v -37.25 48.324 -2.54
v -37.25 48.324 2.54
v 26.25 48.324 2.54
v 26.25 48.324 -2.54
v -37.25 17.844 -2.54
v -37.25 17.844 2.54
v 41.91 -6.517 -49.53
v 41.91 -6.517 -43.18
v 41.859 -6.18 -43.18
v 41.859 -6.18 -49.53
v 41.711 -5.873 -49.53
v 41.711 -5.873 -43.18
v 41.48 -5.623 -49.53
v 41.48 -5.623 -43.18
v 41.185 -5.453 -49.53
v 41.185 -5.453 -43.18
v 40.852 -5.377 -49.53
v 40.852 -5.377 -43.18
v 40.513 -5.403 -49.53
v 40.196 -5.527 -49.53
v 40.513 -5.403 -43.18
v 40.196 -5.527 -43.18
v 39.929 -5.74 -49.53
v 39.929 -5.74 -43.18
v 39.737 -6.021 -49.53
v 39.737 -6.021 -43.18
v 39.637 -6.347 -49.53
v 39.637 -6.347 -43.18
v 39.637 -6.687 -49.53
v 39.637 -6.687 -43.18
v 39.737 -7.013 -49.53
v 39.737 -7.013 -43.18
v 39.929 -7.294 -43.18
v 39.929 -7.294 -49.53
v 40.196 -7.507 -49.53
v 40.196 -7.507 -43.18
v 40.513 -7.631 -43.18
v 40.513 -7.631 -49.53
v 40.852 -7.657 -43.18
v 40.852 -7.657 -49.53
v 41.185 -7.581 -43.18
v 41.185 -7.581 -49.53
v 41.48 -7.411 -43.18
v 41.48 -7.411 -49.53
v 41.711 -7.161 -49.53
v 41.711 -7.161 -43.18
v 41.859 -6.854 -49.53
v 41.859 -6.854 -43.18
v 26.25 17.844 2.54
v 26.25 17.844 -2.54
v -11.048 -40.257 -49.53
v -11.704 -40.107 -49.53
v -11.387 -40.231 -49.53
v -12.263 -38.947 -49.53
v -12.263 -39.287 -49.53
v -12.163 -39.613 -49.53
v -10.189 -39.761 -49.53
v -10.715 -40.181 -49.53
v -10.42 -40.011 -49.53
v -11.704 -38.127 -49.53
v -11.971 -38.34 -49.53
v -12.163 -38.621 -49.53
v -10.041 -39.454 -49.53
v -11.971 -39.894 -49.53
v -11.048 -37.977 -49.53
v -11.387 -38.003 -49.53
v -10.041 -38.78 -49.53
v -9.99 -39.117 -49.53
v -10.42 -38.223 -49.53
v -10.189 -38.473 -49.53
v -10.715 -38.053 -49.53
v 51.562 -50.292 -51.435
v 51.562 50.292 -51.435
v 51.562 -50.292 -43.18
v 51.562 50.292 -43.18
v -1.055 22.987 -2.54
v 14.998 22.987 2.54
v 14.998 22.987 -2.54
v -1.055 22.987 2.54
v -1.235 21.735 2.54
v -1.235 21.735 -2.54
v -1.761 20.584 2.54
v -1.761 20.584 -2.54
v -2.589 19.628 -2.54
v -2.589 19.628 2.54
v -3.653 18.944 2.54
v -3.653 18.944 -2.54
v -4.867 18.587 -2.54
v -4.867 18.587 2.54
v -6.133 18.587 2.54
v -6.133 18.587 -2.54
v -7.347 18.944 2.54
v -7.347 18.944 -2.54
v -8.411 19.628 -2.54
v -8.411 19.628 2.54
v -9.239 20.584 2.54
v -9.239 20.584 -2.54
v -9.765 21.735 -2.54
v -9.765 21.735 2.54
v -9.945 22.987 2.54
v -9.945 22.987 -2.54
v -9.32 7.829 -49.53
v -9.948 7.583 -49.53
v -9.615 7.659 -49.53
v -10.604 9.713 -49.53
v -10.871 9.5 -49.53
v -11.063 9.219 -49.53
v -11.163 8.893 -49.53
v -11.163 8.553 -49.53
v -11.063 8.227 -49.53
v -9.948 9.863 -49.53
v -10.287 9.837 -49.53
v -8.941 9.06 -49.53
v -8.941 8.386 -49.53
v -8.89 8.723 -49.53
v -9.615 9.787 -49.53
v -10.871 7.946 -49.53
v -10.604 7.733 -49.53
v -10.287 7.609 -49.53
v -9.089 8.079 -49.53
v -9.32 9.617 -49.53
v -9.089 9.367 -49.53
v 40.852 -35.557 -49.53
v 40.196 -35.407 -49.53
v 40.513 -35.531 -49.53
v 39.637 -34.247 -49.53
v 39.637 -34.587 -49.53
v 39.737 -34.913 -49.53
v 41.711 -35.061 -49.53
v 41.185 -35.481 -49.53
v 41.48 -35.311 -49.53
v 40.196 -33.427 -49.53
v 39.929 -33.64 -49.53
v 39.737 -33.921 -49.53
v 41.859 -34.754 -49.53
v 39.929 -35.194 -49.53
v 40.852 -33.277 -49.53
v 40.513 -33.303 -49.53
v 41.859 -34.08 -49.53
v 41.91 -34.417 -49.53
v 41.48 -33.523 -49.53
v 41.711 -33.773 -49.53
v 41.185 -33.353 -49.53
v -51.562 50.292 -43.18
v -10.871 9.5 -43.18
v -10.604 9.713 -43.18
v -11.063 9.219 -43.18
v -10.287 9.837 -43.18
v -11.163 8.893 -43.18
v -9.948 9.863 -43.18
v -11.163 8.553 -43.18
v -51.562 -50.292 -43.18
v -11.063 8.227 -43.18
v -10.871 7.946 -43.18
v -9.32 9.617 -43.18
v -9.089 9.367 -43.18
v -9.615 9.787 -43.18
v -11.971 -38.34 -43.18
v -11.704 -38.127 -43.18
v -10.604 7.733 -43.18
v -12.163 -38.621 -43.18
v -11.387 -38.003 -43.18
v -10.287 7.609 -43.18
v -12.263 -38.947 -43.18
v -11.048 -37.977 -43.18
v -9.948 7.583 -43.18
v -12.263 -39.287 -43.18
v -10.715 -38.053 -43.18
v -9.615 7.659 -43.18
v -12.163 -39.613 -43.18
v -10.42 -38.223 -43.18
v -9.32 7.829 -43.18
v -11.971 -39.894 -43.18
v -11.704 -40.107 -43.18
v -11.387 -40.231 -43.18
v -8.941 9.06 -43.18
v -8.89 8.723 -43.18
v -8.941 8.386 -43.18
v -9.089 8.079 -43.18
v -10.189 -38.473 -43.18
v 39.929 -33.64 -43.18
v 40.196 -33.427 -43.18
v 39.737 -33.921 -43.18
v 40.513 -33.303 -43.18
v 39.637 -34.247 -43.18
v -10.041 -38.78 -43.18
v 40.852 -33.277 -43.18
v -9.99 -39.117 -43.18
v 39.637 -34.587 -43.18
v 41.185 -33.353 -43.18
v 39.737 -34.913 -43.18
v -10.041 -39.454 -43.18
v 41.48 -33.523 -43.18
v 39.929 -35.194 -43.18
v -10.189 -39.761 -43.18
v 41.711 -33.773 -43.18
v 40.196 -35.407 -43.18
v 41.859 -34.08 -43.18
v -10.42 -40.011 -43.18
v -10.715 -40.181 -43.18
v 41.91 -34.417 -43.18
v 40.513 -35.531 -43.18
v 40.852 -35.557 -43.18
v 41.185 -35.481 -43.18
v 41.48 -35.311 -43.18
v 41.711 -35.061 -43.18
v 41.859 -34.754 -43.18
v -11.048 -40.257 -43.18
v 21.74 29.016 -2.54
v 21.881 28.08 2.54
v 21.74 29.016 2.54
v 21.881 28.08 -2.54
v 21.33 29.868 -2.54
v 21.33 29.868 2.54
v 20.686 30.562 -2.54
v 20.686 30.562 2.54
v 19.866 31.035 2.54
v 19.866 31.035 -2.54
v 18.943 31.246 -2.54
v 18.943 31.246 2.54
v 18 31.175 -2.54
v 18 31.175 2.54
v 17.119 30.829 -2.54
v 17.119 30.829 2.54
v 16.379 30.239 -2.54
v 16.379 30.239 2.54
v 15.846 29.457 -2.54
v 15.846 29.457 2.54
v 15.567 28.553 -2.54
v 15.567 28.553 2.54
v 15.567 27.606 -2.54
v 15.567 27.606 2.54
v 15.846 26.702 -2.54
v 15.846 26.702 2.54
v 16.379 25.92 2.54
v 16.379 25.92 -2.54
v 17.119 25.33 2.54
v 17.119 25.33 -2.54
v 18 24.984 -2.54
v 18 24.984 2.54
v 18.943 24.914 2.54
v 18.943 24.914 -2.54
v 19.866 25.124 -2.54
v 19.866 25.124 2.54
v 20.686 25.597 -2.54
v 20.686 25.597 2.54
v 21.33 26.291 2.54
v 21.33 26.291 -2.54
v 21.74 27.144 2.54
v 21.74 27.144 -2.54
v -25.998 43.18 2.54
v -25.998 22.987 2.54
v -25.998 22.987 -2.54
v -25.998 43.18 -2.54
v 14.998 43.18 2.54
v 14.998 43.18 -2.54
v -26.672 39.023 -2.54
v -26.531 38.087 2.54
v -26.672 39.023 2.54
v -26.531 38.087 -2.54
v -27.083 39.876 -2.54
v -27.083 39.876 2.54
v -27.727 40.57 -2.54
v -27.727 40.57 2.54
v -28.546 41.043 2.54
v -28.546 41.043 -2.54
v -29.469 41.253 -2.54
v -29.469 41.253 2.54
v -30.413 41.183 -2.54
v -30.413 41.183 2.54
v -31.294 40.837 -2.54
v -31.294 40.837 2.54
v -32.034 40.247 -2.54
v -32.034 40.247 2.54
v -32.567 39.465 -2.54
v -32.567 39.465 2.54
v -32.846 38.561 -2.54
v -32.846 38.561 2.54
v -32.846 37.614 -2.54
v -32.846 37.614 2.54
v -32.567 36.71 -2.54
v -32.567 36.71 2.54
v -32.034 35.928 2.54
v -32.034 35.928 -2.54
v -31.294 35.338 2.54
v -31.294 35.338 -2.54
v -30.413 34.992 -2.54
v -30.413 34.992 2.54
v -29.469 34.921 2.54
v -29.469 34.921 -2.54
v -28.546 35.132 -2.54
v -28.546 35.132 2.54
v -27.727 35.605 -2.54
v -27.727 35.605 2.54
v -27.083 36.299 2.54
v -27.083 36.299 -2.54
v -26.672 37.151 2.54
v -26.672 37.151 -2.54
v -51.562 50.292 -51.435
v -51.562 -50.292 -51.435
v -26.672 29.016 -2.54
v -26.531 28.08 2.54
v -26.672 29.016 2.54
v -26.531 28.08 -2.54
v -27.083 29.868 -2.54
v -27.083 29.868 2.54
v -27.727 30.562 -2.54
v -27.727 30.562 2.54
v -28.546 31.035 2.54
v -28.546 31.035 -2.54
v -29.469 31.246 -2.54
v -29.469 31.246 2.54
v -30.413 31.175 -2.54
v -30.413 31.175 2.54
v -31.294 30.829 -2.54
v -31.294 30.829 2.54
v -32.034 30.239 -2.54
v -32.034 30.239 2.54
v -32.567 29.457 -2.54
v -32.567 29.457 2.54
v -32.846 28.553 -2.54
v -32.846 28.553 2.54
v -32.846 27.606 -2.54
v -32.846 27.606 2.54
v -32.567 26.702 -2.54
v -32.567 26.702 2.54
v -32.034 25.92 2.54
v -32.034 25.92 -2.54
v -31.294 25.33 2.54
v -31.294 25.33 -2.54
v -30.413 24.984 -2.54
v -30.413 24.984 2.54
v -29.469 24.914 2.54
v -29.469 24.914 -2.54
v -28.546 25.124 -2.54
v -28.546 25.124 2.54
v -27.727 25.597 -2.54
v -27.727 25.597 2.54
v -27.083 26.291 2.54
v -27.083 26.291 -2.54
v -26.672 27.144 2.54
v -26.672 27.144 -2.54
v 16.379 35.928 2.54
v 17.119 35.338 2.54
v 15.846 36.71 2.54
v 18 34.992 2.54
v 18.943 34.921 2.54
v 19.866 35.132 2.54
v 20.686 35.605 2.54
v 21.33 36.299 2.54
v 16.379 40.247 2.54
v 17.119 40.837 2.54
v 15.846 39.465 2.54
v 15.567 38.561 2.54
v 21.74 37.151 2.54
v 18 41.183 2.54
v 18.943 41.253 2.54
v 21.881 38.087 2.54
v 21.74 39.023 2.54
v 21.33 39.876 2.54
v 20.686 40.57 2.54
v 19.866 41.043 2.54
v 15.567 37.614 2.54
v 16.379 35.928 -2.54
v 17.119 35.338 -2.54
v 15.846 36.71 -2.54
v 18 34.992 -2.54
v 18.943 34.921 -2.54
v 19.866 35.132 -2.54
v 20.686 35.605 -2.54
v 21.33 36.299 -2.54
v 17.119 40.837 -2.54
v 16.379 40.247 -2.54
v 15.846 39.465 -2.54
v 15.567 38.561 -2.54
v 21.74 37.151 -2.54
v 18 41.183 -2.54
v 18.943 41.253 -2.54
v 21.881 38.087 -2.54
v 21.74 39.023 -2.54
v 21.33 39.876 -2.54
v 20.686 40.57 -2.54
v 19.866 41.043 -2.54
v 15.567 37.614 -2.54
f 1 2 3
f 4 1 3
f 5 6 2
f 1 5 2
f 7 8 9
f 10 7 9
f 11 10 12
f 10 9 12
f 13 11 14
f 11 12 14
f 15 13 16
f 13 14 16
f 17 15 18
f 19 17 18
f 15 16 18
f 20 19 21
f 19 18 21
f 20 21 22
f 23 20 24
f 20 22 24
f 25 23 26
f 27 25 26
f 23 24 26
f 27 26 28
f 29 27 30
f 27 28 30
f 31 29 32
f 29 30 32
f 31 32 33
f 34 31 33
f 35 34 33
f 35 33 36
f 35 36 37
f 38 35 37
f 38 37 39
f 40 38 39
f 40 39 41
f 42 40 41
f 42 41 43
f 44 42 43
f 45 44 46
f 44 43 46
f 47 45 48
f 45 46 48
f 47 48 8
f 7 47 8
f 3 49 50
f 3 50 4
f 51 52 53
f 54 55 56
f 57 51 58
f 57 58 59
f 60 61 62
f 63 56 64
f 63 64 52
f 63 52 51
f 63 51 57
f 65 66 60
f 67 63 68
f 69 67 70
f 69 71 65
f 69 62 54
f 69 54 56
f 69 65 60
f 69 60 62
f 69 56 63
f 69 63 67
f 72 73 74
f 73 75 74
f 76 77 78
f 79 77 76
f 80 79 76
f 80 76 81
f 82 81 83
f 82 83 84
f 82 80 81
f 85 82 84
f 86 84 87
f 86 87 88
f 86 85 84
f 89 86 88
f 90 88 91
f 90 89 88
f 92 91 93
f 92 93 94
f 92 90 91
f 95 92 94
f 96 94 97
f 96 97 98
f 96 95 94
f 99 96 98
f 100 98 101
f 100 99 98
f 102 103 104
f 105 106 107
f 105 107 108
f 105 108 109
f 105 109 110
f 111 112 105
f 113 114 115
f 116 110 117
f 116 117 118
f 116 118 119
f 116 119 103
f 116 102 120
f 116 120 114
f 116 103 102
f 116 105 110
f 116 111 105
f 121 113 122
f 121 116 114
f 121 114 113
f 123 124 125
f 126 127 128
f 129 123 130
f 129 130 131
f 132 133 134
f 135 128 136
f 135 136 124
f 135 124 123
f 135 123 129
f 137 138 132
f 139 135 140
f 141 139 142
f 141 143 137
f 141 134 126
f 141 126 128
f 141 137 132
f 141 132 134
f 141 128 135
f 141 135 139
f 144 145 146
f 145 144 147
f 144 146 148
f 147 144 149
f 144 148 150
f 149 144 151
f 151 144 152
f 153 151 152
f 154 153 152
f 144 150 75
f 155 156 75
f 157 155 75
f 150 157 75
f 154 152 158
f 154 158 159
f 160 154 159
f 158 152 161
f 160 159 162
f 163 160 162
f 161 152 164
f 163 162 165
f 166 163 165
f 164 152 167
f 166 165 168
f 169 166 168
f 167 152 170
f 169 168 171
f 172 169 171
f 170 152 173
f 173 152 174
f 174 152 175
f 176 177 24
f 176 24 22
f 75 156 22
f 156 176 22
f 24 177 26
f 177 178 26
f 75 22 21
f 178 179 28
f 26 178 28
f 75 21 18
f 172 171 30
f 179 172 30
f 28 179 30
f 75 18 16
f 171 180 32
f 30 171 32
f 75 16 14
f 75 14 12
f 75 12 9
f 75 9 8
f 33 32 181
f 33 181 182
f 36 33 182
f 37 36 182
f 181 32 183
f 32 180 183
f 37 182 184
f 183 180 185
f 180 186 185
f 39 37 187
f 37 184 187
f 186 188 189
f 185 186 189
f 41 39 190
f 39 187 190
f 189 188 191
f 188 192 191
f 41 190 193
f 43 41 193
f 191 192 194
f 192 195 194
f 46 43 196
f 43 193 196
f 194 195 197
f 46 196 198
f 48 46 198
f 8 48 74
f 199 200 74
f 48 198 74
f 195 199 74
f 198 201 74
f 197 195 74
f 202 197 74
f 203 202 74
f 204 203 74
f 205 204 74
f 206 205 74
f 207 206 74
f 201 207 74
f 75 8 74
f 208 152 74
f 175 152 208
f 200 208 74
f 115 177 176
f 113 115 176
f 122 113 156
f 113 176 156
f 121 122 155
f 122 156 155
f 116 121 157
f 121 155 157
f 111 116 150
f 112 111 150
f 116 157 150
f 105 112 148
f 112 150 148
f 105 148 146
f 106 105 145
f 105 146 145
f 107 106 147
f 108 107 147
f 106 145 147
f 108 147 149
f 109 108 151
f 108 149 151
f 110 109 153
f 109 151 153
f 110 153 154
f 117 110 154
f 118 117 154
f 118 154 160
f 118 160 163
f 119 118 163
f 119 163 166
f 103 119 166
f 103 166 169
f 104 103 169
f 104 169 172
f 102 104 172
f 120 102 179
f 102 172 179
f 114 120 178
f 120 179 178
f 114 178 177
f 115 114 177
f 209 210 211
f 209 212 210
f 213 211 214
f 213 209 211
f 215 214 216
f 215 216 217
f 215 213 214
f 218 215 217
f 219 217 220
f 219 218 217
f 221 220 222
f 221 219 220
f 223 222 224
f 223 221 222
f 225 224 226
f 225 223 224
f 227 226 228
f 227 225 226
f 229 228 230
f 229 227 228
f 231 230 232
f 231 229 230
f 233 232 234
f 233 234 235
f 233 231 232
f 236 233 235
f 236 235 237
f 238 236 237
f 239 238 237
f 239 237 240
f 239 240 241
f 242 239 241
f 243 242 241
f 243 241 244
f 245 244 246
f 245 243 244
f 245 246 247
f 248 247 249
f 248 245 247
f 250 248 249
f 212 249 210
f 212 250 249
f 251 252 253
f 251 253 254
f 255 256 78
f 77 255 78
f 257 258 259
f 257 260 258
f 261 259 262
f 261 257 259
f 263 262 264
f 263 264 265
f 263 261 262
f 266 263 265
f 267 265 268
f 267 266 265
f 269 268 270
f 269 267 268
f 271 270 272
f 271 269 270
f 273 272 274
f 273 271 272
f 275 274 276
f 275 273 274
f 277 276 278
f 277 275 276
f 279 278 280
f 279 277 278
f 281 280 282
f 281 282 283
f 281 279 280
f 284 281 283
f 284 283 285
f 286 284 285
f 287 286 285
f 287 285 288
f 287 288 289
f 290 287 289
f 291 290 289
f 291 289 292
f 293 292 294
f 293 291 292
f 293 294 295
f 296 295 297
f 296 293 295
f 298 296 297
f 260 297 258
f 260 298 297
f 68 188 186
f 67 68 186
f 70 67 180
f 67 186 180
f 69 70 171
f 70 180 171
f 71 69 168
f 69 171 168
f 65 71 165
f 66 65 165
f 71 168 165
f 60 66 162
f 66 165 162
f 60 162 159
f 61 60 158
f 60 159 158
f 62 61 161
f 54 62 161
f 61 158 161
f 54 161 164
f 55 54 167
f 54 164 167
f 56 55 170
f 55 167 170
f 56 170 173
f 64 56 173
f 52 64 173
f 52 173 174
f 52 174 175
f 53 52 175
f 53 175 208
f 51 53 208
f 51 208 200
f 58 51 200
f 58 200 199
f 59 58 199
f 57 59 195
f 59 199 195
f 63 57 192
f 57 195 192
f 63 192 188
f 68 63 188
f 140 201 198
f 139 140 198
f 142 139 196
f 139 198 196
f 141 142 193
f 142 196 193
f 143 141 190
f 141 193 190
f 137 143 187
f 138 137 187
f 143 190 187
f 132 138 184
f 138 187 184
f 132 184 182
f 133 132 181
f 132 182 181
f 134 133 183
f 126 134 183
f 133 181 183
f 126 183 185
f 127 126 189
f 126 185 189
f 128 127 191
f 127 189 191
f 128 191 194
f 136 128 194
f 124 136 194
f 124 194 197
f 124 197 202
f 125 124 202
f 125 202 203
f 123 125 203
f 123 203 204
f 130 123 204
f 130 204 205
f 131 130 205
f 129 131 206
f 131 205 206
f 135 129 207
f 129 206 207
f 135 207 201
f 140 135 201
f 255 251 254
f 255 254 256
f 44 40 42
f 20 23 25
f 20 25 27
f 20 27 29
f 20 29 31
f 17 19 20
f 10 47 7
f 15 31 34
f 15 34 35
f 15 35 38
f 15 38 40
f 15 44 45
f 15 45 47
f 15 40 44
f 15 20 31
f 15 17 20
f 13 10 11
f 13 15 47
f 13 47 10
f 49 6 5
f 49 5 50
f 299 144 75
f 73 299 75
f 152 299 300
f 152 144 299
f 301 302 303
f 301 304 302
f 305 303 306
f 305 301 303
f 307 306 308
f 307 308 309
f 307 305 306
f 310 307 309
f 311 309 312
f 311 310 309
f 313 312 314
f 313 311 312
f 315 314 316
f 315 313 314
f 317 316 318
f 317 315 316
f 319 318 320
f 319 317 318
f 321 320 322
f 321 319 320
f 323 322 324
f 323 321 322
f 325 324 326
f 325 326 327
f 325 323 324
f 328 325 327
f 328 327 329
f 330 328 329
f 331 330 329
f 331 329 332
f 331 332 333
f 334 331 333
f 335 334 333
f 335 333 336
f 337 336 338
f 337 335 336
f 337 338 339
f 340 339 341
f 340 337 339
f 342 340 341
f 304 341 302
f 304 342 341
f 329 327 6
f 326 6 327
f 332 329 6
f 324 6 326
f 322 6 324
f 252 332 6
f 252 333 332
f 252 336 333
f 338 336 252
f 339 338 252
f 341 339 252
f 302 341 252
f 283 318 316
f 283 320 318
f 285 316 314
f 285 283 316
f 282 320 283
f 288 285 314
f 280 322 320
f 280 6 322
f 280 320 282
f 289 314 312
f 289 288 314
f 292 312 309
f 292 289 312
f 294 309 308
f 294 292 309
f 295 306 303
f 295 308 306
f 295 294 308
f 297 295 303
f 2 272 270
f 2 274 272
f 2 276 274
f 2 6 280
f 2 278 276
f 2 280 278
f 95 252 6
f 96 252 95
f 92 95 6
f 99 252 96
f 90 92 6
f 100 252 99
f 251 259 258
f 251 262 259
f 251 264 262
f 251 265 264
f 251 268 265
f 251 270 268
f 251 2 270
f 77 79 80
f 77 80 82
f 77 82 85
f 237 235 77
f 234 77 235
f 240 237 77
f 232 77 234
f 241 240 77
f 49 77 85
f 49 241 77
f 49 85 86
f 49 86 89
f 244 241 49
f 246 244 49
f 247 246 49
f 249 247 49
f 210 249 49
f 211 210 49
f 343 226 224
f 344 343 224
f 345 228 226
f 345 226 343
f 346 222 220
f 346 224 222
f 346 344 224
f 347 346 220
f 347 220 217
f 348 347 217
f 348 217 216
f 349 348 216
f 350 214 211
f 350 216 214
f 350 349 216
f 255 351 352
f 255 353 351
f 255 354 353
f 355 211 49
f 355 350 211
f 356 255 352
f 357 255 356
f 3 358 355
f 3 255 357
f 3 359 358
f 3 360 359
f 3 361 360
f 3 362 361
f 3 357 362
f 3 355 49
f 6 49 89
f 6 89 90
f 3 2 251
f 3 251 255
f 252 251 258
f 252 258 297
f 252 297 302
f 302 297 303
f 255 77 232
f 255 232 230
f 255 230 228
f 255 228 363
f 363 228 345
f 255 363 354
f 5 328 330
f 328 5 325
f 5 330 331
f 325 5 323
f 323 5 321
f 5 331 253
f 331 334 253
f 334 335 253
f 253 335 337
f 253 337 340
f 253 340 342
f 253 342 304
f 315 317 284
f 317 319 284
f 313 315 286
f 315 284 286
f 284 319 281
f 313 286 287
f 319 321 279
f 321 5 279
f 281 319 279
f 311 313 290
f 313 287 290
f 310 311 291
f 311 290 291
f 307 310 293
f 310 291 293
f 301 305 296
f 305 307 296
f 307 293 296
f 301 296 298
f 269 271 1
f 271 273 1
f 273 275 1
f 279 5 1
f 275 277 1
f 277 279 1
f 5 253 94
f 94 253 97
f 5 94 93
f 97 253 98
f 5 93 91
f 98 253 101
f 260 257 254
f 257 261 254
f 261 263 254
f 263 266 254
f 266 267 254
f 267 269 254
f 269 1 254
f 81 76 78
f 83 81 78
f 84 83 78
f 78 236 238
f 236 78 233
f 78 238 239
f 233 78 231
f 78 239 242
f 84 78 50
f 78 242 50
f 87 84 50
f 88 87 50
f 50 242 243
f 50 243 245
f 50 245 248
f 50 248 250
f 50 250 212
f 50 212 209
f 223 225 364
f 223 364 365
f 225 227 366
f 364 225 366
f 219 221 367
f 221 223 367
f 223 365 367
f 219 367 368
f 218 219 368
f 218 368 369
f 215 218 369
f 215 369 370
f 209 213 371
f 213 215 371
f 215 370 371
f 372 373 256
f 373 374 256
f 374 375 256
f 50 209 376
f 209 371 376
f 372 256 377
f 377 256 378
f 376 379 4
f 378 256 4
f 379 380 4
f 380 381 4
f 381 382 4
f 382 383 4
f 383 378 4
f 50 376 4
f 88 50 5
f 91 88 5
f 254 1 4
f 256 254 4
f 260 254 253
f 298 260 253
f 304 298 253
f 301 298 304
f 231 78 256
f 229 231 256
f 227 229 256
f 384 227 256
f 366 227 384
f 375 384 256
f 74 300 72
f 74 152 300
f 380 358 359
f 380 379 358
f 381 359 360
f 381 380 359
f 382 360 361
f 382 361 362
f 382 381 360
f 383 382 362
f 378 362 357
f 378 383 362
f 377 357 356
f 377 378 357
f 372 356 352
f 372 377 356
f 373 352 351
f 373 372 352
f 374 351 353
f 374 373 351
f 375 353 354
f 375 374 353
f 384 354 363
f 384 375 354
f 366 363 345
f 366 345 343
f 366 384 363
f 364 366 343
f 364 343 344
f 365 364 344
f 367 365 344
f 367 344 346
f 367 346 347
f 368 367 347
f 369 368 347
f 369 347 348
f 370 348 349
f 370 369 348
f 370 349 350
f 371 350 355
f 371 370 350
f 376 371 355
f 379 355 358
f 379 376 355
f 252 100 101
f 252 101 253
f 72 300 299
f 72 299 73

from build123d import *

# Parameters (mm, degrees)
F0_R      = 3.175
F1_DEPTH  = 2.54
F2_W      = 114.3
F2_H      = 114.3
F2_W_2    = 104.14
F2_H_2    = 101.6
F3_DEPTH  = 3.175
F4_W      = 103.124
F4_H      = 100.584
F4_W_2    = 92.964
F4_H_2    = 90.424
F5_DEPTH  = 48.895
F6_W      = 103.124
F6_H      = 100.584
F7_DEPTH  = 8.255
F8_R      = 1.143
F9_DEPTH  = 6.35
F10_R     = 6.35
F11_R     = 1.143
F12_DEPTH = 12.7
F13_R     = 1.651
F14_DEPTH = 53.976
F15_W     = 114.3
F15_H     = 114.3
F15_W_2   = 63.5
F15_H_2   = 30.48
F16_DEPTH = 45.72
F17_W     = 63.5
F17_H     = 3.1115
F18_DEPTH = 45.721


with BuildPart() as f1:
    # F0 (on Top) → F1 (new body, symmetric)
    with BuildSketch(Plane.XY):
        Polygon((57.15, -57.15), (57.15, 57.15), (0, 57.15), (-5.5, 57.15), (-57.15, 57.15), (-57.15, -57.15), align=None)
        with Locations((-29.7062, 28.0797)):
            Circle(F0_R, mode=Mode.SUBTRACT)
        with Locations((-29.7062, 38.0873)):
            Circle(F0_R, mode=Mode.SUBTRACT)
        with BuildLine():
            Line((-25.9978, 22.987), (-25.9978, 43.18))
            Line((-25.9978, 43.18), (14.9978, 43.18))
            Line((14.9978, 43.18), (14.9978, 22.987))
            Line((14.9978, 22.987), (-1.055, 22.987))
            ThreePointArc((-1.055, 22.987), (-5.5, 18.542), (-9.945, 22.987))
            Line((-9.945, 22.987), (-25.9978, 22.987))
        make_face(mode=Mode.SUBTRACT)
        with Locations((18.7062, 28.0797)):
            Circle(F0_R, mode=Mode.SUBTRACT)
        with Locations((18.7062, 38.0873)):
            Circle(F0_R, mode=Mode.SUBTRACT)
    extrude(amount=F1_DEPTH, both=True)

    # F2 (on face) → F3 (join)
    with BuildSketch(Plane(origin=(0, 0, -2.54), x_dir=(1, 0, 0), z_dir=(0, 0, -1))):
        Rectangle(F2_W, F2_H)
        Rectangle(F2_W_2, F2_H_2, mode=Mode.SUBTRACT)
    extrude(amount=F3_DEPTH)

    # F13 (on face) → F14 (cut, through all)
    with BuildSketch(Plane.XY.offset(2.54)):
        with Locations((-48.006, -46.736)):
            Circle(F13_R)
        with Locations((-48.006, 46.736)):
            Circle(F13_R)
        with Locations((48.006, 46.736)):
            Circle(F13_R)
        with Locations((48.006, -46.736)):
            Circle(F13_R)
    extrude(amount=-F14_DEPTH, mode=Mode.SUBTRACT)


with BuildPart() as f5:
    # F4 (on face) → F5 (new body)
    with BuildSketch(Plane(origin=(0, 0, -2.54), x_dir=(1, 0, 0), z_dir=(0, 0, -1))):
        Rectangle(F4_W, F4_H)
        Rectangle(F4_W_2, F4_H_2, mode=Mode.SUBTRACT)
    extrude(amount=F5_DEPTH)

    # F6 (on face) → F7 (join)
    with BuildSketch(Plane(origin=(0, 0, -51.435), x_dir=(1, 0, 0), z_dir=(0, 0, -1))):
        Rectangle(F6_W, F6_H)
    extrude(amount=-F7_DEPTH)

    # F8 (on face) → F9 (cut)
    with BuildSketch(Plane.XY.offset(-43.18)):
        with Locations((-10.033, 8.723)):
            Circle(F8_R)
        with Locations((40.767, -6.517)):
            Circle(F8_R)
        with Locations((40.767, -34.417)):
            Circle(F8_R)
        with Locations((-11.133, -39.117)):
            Circle(F8_R)
    extrude(amount=-F9_DEPTH, mode=Mode.SUBTRACT)

    # F10
    f10_edges = [f5.edges().sort_by_distance(p)[0] for p in [
        (-46.482, 45.212, -22.86),
        (46.482, 45.212, -22.86),
        (46.482, -45.212, -22.86),
        (-46.482, -45.212, -22.86),
    ]]
    fillet(f10_edges, radius=F10_R)

    # F11 (on face) → F12 (cut)
    with BuildSketch(Plane.XY.offset(-2.54)):
        with Locations((-48.006, 46.736)):
            Circle(F11_R)
        with Locations((48.006, 46.736)):
            Circle(F11_R)
        with Locations((48.006, -46.736)):
            Circle(F11_R)
        with Locations((-48.006, -46.736)):
            Circle(F11_R)
    extrude(amount=-F12_DEPTH, mode=Mode.SUBTRACT)


with BuildPart() as f16_tool:
    # F15 (on face) → F16 (new body, through all)
    with BuildSketch(Plane.XY.offset(2.54)):
        Rectangle(F15_W, F15_H)
        with Locations((-5.5, 33.0835)):
            Rectangle(F15_W_2, F15_H_2, mode=Mode.SUBTRACT)
    extrude(amount=-F16_DEPTH)


with BuildPart() as f1_1:
    add(f1.part)

    # F16: cut by f16_tool
    add(f16_tool.part, mode=Mode.SUBTRACT)


with BuildPart() as f5_1:
    add(f5.part)

    # F16: cut by f16_tool
    add(f16_tool.part, mode=Mode.SUBTRACT)

    # F17 (on face) → F18 (cut, through all)
    with BuildSketch(Plane.XY.offset(-43.18)):
        with Locations((-5.5, 46.76775)):
            Rectangle(F17_W, F17_H)
    extrude(amount=F18_DEPTH, mode=Mode.SUBTRACT)


solid = Compound([f1_1.part, f5_1.part])
